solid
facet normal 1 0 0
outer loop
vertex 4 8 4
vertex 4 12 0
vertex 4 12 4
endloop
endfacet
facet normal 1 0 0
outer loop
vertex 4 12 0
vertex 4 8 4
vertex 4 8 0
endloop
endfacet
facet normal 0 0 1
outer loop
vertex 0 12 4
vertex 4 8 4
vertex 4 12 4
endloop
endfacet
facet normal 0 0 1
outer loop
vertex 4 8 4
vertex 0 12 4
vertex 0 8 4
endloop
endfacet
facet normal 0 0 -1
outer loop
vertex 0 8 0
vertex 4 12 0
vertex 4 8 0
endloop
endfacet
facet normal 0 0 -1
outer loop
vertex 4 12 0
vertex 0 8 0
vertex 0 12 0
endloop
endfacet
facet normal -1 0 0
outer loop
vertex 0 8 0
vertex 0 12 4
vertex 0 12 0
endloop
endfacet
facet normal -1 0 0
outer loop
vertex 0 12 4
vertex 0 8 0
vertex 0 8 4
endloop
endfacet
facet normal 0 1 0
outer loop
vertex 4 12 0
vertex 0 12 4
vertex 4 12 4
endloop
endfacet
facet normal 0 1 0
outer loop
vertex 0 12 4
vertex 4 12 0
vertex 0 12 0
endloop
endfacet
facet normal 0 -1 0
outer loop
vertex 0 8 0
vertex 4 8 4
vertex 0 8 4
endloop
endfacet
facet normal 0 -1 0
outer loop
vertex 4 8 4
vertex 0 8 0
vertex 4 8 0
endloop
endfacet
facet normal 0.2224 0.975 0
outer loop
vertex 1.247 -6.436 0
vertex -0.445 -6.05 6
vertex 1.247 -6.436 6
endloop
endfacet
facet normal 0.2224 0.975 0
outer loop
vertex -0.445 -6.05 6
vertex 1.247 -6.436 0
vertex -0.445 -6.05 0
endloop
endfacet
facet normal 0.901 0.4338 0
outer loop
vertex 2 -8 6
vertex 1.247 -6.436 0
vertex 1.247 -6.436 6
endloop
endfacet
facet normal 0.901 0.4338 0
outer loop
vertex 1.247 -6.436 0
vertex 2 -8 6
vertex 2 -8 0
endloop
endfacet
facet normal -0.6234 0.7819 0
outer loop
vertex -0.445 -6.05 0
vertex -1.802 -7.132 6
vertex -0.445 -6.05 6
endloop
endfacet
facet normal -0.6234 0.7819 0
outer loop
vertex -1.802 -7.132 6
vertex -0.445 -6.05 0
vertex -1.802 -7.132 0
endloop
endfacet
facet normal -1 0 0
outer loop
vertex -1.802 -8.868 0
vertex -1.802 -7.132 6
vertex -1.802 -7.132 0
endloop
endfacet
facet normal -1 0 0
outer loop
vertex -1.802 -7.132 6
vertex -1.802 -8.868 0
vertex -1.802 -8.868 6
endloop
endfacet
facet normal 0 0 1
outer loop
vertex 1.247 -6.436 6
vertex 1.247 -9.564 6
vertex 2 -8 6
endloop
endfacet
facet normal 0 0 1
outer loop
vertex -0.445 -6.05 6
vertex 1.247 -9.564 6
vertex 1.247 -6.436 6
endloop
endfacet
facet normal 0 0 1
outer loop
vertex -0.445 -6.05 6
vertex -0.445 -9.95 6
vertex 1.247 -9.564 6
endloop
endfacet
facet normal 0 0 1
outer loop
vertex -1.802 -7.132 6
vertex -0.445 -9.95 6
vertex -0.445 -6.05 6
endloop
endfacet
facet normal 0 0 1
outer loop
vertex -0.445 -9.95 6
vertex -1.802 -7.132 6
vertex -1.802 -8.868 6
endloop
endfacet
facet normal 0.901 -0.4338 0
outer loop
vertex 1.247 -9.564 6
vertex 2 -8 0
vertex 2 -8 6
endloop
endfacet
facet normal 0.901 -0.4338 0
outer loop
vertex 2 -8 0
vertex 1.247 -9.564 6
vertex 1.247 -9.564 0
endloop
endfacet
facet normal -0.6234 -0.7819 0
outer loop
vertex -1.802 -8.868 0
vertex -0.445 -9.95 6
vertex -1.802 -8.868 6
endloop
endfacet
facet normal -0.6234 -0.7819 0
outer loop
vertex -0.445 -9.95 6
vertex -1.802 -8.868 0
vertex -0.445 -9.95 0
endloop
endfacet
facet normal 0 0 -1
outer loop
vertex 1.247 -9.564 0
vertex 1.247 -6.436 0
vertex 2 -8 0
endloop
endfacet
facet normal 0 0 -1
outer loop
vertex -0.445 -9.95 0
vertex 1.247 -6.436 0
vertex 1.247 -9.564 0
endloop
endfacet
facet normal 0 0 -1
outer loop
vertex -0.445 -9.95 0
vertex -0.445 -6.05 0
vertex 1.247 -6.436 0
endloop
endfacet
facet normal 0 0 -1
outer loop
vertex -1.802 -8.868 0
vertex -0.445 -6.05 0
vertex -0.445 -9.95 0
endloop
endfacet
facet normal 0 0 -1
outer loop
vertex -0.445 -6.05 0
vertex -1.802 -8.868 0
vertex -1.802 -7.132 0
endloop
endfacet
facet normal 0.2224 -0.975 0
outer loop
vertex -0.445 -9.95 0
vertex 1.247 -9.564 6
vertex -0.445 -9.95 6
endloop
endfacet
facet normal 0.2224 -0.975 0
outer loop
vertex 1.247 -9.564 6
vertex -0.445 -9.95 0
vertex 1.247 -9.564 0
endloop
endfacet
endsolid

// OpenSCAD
// BOSL-style fwd() and back() transforms
module fwd(y) {
    translate([0, y, 0]) children();
}

module back(y) {
    translate([0, -y, 0]) children();
}

fwd(8) cube(4);
back(8) cylinder(h=6, r=2);
